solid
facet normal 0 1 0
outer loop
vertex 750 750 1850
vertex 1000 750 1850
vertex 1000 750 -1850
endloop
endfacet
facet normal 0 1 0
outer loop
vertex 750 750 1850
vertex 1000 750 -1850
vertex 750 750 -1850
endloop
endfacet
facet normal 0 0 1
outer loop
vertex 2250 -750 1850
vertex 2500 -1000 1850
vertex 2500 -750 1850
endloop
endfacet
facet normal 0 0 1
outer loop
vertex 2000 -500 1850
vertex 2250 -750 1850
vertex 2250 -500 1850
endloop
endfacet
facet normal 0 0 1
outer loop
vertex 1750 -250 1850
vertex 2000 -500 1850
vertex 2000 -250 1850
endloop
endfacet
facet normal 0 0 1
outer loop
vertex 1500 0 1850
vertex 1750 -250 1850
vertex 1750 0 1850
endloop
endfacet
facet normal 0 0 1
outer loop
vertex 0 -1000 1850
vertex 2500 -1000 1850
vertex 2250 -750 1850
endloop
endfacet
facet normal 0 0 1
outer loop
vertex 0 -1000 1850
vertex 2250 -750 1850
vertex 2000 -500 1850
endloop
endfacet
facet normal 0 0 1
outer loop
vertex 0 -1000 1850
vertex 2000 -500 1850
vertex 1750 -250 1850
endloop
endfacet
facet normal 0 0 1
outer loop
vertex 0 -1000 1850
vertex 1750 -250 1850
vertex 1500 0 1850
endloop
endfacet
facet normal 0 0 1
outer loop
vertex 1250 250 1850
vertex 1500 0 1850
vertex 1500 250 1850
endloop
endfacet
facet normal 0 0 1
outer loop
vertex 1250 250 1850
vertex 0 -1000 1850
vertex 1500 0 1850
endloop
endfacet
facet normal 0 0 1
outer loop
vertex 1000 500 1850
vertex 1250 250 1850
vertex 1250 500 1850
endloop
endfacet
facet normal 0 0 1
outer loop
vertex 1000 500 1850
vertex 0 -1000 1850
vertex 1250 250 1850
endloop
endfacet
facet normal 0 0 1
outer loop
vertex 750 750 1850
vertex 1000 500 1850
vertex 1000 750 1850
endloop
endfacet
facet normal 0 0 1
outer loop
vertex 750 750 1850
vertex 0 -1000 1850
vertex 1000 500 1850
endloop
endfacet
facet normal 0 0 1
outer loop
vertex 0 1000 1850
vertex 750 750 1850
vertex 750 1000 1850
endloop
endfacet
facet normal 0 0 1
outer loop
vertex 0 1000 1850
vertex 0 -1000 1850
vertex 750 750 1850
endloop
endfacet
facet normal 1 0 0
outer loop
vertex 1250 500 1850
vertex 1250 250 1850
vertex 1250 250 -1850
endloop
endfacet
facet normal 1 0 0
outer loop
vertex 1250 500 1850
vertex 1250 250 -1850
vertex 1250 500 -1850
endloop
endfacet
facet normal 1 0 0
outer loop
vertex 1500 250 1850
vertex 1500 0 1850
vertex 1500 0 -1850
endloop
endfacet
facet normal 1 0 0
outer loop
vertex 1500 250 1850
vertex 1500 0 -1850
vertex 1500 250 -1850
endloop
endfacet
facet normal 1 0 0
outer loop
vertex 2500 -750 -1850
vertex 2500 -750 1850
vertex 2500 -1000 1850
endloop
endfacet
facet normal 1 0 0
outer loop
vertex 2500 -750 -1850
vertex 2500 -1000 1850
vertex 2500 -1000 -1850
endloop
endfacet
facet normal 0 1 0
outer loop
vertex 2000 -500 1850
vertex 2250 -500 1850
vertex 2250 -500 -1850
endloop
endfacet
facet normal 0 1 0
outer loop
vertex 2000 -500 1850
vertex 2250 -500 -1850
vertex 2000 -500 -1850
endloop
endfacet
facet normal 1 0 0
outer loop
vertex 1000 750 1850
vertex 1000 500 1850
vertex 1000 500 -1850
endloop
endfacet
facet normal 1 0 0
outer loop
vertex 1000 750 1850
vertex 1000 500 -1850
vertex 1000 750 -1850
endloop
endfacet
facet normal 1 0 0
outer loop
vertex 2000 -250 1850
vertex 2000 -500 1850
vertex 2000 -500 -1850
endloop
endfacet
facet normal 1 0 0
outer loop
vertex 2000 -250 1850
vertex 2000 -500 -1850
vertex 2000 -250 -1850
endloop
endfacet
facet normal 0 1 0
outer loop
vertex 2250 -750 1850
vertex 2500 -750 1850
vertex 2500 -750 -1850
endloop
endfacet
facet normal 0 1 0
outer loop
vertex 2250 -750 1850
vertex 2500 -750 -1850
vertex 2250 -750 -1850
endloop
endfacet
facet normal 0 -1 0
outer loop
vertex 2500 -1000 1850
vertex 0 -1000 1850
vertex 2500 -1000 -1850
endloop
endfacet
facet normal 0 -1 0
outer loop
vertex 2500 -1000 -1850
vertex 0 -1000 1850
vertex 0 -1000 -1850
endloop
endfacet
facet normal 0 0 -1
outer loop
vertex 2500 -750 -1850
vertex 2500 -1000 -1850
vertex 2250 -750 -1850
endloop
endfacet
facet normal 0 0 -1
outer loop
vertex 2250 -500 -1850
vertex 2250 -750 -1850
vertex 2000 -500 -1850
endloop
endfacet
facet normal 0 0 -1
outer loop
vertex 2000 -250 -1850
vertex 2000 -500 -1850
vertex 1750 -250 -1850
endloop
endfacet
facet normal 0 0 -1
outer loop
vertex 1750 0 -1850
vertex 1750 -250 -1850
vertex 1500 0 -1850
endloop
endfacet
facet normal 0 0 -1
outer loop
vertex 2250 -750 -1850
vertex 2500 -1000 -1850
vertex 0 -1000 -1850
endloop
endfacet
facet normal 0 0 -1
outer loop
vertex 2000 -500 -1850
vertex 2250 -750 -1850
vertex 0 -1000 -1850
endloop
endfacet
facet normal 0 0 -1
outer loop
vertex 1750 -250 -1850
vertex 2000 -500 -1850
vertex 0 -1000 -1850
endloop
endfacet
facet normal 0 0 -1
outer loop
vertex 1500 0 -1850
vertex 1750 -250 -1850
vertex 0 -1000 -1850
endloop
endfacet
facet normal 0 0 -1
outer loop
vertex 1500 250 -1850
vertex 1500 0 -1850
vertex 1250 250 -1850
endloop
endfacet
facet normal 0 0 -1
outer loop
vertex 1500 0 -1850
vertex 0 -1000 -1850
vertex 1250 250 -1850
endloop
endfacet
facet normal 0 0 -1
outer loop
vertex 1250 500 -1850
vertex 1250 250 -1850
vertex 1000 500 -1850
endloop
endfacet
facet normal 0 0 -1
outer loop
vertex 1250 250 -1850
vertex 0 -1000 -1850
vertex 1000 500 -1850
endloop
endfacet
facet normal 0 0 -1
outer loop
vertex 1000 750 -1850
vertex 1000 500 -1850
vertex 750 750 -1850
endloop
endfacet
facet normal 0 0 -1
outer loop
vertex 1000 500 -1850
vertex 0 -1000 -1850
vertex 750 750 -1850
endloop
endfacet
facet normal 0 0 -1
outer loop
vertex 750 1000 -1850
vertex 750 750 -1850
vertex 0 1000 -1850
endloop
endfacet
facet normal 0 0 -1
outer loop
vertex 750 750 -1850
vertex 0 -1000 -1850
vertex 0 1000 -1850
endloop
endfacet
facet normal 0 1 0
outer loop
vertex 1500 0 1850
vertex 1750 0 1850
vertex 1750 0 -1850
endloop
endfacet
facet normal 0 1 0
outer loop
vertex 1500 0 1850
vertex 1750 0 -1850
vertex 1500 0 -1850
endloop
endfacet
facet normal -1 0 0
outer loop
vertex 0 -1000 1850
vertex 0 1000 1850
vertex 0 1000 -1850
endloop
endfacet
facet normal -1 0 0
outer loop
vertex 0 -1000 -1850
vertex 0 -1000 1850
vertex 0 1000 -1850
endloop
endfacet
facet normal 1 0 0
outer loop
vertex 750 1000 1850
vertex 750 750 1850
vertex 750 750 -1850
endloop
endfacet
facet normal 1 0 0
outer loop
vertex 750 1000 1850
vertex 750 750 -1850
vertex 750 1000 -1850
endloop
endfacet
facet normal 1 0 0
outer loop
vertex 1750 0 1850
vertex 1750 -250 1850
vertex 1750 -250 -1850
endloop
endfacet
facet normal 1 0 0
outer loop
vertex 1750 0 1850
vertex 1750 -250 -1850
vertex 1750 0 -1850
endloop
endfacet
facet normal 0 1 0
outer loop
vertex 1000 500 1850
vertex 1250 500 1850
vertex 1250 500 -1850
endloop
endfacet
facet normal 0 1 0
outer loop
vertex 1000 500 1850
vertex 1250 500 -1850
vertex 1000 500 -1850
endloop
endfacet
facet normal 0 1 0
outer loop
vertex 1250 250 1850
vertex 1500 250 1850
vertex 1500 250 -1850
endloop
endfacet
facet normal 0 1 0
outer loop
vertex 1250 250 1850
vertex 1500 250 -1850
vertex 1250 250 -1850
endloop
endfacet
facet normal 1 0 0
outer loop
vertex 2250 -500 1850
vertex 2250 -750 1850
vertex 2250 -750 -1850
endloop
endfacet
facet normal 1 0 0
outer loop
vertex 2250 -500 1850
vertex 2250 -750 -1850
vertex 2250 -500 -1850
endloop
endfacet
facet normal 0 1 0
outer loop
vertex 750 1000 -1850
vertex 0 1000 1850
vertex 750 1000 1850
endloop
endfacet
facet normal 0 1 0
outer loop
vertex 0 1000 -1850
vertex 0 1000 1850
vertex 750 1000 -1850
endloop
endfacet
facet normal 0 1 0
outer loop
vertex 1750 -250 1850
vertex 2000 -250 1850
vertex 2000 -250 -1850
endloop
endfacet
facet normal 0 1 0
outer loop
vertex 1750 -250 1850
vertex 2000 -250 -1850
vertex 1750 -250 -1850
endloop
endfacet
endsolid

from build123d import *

# Parameters (mm, degrees)
SKETCH1_W           = 3700
SKETCH1_H           = 2000
BOSS_EXTRUDE1_DEPTH = 2500
CUT_EXTRUDE1_DEPTH  = 5000


with BuildPart() as part:
    # Sketch1 → Boss-Extrude1 (new body)
    with BuildSketch(Plane(origin=(0, 0, 0), x_dir=(0, 0, -1), z_dir=(1, 0, 0))):
        Rectangle(SKETCH1_W, SKETCH1_H)
    extrude(amount=BOSS_EXTRUDE1_DEPTH)

    # Sketch4 → Cut-Extrude1 (cut)
    with BuildSketch(Plane.XY.offset(1850)):
        Polygon((2500, -750), (2250, -750), (2250, -500), (2000, -500), (2000, -250), (1750, -250), (1750, 0), (1500, 0), (1500, 250), (1250, 250), (1250, 500), (1000, 500), (1000, 750), (750, 750), (750, 1000), (2500, 1000), align=None)
    extrude(amount=-CUT_EXTRUDE1_DEPTH, mode=Mode.SUBTRACT)


solid = part.part
